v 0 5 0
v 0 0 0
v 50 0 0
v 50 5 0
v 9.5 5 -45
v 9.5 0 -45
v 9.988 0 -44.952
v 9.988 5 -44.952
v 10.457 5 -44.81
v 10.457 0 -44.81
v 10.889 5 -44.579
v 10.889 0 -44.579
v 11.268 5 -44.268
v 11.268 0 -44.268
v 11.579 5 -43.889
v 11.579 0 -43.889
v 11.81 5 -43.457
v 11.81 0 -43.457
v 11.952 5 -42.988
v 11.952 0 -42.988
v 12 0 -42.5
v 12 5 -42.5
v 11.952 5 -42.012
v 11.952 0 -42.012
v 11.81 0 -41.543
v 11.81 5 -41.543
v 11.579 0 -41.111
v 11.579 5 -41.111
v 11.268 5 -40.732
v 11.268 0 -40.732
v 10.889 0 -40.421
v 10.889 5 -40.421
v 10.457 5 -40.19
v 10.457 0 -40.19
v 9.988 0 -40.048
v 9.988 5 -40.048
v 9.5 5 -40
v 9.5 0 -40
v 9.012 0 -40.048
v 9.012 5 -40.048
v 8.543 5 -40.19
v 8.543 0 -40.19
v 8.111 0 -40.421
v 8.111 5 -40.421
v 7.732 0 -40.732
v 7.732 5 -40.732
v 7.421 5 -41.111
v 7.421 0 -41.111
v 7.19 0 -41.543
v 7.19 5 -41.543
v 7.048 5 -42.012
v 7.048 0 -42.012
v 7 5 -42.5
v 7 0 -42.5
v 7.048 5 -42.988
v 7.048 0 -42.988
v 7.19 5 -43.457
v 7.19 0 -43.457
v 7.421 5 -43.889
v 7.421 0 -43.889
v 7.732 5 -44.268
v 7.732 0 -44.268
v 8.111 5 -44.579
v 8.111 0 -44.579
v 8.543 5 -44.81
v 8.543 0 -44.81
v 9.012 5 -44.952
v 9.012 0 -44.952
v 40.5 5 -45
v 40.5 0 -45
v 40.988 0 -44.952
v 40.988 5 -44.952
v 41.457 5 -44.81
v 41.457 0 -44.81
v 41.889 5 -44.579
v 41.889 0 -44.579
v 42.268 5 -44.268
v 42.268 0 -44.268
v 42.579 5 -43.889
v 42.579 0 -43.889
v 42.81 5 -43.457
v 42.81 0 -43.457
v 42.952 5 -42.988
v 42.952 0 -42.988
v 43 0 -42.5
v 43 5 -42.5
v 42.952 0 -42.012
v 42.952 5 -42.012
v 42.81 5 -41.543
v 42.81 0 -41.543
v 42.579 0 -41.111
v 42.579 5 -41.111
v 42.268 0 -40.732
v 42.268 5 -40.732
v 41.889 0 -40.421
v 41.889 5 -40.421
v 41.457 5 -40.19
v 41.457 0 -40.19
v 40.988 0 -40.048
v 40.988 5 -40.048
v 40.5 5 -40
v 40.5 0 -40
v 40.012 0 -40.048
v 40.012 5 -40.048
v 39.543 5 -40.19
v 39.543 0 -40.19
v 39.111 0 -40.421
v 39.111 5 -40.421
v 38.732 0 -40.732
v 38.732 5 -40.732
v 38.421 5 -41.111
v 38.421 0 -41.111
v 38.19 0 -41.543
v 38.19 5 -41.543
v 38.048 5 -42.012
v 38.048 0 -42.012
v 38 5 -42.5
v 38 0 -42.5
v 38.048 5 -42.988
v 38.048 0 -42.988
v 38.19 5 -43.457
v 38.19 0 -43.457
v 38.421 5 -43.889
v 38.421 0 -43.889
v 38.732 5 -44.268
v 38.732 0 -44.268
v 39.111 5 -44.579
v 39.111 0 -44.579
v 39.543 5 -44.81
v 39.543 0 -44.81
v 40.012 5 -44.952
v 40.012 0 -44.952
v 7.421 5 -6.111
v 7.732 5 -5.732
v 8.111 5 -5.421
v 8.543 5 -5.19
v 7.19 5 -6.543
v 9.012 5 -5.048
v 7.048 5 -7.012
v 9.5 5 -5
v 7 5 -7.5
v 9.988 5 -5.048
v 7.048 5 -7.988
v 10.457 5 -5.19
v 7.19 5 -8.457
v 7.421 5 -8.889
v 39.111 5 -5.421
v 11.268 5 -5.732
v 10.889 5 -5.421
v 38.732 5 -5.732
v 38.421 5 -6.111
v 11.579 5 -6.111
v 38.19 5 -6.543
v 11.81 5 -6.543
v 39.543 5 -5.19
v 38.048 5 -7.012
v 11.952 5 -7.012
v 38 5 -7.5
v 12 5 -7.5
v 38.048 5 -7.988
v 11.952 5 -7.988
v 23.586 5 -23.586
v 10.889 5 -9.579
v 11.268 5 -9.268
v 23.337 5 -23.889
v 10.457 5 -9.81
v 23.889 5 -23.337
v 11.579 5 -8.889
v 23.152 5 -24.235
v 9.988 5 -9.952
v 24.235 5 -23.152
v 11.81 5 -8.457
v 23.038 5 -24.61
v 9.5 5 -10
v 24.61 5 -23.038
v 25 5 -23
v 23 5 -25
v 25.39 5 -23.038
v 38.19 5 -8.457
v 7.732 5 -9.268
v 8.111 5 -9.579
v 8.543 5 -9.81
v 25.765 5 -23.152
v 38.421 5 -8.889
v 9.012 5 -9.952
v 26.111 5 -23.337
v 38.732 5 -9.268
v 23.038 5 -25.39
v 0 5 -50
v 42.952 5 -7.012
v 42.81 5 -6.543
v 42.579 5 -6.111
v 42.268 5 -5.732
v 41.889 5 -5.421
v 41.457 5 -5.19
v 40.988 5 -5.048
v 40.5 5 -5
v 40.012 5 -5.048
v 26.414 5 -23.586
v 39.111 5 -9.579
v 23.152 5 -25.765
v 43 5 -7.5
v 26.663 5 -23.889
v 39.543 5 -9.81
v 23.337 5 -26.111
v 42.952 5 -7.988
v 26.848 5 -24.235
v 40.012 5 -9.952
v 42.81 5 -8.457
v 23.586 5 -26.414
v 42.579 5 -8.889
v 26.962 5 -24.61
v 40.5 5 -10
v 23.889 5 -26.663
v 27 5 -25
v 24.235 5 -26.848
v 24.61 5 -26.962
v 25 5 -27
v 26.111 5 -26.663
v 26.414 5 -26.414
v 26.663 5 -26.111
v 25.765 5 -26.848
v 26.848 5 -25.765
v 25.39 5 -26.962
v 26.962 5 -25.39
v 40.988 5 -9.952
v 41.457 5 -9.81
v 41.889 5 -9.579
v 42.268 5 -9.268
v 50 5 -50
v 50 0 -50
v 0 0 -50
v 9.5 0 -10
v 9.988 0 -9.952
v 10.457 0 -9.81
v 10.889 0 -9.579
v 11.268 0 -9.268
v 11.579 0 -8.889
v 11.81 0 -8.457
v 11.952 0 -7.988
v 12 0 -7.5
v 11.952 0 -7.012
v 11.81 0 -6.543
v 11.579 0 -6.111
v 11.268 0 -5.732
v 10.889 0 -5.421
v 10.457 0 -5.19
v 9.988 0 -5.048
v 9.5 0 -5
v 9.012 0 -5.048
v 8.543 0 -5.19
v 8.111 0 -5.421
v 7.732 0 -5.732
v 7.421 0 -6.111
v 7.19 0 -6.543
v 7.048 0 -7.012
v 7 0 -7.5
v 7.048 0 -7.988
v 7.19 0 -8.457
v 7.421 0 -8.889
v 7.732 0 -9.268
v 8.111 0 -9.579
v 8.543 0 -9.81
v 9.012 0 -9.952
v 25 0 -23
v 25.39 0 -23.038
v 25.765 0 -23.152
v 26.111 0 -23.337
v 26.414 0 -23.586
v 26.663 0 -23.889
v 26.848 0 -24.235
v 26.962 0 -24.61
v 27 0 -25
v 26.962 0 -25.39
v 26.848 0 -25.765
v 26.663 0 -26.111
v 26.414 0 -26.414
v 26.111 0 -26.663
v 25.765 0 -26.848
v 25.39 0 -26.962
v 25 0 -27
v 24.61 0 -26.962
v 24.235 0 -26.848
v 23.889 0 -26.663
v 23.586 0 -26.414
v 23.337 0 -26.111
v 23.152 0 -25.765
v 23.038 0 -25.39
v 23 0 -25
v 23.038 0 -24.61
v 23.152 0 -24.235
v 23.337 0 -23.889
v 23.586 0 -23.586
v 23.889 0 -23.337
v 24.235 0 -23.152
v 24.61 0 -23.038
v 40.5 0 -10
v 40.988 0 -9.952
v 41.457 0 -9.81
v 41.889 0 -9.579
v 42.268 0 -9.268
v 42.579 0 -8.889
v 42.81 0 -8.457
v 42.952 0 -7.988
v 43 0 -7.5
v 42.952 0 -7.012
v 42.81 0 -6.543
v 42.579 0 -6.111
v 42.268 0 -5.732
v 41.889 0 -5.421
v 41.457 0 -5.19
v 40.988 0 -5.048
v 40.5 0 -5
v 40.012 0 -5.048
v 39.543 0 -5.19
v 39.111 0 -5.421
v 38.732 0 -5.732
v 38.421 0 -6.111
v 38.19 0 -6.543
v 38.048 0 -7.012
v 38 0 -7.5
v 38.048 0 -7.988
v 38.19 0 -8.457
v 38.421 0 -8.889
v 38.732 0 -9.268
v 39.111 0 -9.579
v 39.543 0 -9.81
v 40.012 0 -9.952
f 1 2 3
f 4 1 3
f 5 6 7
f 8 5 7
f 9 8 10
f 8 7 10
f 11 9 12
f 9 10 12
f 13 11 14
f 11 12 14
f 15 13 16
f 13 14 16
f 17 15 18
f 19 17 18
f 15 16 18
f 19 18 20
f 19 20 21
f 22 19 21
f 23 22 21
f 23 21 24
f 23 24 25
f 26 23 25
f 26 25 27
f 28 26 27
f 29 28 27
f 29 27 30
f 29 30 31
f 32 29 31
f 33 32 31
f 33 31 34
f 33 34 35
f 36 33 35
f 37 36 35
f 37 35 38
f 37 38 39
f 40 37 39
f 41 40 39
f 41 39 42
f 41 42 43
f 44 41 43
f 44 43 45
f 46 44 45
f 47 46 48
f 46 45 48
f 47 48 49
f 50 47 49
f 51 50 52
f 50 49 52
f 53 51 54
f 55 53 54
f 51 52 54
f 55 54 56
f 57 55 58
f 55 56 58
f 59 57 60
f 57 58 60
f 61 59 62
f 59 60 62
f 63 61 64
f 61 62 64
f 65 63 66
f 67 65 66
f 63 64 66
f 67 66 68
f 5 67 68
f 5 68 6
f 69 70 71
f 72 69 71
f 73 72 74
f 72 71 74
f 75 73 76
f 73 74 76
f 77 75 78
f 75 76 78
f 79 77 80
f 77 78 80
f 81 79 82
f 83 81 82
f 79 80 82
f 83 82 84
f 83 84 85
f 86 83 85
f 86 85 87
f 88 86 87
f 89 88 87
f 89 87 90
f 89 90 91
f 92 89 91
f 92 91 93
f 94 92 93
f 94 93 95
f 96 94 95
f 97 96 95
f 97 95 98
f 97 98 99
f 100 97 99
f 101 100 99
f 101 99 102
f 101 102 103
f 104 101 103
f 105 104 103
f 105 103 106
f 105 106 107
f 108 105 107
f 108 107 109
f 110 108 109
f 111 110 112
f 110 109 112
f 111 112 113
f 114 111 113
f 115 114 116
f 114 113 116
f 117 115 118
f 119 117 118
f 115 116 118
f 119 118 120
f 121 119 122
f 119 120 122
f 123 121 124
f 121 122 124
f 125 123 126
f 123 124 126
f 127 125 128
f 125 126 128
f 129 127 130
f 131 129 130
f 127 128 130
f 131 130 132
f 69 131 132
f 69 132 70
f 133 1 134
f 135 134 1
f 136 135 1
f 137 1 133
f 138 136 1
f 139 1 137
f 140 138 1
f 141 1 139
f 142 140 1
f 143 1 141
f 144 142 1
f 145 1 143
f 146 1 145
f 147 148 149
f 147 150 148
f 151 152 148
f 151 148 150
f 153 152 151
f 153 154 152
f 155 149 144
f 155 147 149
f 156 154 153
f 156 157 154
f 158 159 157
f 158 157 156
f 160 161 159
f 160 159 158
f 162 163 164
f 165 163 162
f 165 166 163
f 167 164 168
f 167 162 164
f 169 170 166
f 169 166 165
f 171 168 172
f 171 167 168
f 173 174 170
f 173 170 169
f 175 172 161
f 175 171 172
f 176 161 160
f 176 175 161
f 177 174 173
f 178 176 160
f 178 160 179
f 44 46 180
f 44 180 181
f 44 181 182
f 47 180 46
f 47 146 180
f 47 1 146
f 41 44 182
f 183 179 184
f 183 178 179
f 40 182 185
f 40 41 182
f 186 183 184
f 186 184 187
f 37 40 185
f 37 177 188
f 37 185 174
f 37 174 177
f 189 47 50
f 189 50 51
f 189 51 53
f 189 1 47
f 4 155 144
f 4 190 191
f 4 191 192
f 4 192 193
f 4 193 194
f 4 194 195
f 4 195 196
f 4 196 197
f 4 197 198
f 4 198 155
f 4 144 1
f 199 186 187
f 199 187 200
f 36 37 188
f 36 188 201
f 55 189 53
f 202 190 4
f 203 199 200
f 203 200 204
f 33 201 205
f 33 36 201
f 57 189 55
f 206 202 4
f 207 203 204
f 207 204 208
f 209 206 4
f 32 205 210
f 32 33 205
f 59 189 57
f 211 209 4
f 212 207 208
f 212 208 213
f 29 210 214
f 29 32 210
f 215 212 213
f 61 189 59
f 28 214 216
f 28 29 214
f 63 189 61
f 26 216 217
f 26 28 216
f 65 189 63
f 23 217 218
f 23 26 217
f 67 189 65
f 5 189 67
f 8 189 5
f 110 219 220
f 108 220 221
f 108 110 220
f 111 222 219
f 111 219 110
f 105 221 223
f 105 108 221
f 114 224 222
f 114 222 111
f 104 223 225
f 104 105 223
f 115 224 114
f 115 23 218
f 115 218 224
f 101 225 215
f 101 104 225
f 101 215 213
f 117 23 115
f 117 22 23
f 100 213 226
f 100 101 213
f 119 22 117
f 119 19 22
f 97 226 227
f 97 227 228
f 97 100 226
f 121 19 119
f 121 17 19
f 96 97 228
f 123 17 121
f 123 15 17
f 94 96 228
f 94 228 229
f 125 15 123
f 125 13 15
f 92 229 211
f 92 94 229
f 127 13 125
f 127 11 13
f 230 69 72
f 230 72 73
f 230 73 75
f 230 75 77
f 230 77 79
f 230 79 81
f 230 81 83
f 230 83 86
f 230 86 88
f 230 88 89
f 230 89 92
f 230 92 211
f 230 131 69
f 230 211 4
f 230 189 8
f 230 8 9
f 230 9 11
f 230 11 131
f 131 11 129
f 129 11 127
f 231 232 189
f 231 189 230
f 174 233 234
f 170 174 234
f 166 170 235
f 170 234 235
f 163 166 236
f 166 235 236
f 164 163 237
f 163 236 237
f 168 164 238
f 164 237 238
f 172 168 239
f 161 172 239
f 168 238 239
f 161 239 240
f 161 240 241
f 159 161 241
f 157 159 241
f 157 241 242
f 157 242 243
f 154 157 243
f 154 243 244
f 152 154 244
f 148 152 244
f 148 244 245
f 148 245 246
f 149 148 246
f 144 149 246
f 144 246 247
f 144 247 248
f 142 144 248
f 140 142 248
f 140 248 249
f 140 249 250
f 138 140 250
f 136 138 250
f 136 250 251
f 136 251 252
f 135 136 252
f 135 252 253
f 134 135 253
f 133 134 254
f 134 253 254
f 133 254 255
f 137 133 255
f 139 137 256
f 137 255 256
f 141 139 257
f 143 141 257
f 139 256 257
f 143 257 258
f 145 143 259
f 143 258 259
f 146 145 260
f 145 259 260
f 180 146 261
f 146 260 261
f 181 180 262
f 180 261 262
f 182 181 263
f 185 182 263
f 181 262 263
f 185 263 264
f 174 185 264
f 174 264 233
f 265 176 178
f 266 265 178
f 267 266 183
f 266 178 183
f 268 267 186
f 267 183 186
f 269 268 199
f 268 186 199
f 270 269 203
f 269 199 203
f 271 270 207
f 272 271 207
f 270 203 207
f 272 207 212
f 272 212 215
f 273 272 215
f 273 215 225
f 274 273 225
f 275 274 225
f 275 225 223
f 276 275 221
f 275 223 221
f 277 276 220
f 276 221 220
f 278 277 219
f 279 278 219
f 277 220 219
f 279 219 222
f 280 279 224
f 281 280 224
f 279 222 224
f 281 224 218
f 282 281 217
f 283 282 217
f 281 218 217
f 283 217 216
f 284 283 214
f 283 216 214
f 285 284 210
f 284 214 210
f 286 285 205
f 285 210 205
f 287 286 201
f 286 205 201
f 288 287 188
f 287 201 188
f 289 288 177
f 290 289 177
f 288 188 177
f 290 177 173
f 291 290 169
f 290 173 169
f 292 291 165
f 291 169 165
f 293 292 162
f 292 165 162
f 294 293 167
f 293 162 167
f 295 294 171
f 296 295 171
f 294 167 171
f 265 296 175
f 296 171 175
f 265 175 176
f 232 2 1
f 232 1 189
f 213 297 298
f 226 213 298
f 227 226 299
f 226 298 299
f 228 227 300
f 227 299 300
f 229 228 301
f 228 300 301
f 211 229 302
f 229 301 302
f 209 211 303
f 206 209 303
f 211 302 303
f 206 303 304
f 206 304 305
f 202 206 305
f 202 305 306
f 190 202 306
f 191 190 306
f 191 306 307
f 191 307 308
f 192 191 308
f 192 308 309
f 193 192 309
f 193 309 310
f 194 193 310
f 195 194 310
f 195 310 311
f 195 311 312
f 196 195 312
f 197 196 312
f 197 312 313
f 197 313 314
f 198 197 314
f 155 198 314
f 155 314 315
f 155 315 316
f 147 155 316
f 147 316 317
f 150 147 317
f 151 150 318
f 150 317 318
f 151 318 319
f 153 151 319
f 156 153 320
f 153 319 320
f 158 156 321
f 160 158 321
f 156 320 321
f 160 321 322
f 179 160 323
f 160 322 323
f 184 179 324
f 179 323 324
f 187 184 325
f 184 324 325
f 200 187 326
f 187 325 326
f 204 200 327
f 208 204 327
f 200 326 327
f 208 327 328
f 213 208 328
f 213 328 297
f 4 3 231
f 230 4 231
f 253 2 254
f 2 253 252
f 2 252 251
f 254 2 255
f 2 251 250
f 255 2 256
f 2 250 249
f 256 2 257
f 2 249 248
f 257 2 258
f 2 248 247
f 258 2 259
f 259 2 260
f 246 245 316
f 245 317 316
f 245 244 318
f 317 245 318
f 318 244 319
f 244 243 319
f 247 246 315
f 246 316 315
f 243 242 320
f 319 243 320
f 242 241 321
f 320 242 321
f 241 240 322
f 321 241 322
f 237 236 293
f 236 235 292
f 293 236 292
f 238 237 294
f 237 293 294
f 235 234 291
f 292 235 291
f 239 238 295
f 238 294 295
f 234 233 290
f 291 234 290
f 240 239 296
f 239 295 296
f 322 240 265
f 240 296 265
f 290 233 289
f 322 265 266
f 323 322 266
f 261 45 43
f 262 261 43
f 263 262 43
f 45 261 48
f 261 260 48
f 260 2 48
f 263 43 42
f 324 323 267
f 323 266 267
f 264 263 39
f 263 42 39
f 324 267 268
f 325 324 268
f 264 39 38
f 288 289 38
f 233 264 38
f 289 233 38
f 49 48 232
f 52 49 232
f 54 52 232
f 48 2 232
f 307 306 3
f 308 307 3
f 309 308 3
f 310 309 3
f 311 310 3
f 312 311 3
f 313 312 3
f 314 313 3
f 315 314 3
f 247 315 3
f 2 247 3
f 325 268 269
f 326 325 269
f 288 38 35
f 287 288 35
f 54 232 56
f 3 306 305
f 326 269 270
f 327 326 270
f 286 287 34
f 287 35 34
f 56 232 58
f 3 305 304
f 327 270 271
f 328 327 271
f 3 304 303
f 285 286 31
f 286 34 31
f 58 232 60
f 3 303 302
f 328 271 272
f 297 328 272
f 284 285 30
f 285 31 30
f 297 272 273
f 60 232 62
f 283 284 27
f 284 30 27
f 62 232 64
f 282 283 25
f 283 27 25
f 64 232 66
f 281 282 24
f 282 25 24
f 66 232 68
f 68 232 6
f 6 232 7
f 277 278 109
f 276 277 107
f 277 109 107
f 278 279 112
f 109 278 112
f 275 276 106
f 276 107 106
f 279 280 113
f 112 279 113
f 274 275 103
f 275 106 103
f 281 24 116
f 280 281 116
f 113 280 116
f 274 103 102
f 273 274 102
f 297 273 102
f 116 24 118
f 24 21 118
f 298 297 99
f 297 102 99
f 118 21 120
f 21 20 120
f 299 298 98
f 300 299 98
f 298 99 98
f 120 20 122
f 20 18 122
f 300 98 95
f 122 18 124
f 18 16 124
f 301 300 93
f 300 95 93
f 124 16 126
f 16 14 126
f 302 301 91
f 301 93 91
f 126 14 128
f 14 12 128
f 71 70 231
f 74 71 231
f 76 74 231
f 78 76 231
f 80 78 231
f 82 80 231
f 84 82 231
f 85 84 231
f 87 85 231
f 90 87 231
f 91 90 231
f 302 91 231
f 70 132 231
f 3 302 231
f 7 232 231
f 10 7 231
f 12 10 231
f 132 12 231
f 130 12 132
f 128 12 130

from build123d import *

# Parameters (mm, degrees)
SKETCH1_W           = 50
SKETCH1_H           = 50
BOSS_EXTRUDE1_DEPTH = 5
SKETCH2_R           = 2
CUT_EXTRUDE1_DEPTH  = 5
SKETCH3_R           = 2.5
CUT_EXTRUDE2_DEPTH  = 10


with BuildPart() as part:
    # Sketch1 → Boss-Extrude1 (new body)
    with BuildSketch(Plane(origin=(0, 0, 0), x_dir=(1, 0, 0), z_dir=(0, 1, 0))):
        with Locations((25, 25)):
            Rectangle(SKETCH1_W, SKETCH1_H)
    extrude(amount=BOSS_EXTRUDE1_DEPTH)

    # Sketch2 → Cut-Extrude1 (cut)
    with BuildSketch(Plane(origin=(0, 5, 0), x_dir=(1, 0, 0), z_dir=(0, 1, 0))):
        with Locations(Location((25, 25, 0), (0, 0, 270))):
            Circle(SKETCH2_R)
    extrude(amount=-CUT_EXTRUDE1_DEPTH, mode=Mode.SUBTRACT)

    # Sketch3 → Cut-Extrude2 (cut)
    with BuildSketch(Plane.XZ):
        with Locations(Location((40.5, -42.5, 0), (0, 0, 270))):
            Circle(SKETCH3_R)
        with Locations(Location((9.5, -42.5, 0), (0, 0, 270))):
            Circle(SKETCH3_R)
        with Locations(Location((9.5, -7.5, 0), (0, 0, 270))):
            Circle(SKETCH3_R)
        with Locations(Location((40.5, -7.5, 0), (0, 0, 270))):
            Circle(SKETCH3_R)
    extrude(amount=-CUT_EXTRUDE2_DEPTH, mode=Mode.SUBTRACT)


solid = part.part
